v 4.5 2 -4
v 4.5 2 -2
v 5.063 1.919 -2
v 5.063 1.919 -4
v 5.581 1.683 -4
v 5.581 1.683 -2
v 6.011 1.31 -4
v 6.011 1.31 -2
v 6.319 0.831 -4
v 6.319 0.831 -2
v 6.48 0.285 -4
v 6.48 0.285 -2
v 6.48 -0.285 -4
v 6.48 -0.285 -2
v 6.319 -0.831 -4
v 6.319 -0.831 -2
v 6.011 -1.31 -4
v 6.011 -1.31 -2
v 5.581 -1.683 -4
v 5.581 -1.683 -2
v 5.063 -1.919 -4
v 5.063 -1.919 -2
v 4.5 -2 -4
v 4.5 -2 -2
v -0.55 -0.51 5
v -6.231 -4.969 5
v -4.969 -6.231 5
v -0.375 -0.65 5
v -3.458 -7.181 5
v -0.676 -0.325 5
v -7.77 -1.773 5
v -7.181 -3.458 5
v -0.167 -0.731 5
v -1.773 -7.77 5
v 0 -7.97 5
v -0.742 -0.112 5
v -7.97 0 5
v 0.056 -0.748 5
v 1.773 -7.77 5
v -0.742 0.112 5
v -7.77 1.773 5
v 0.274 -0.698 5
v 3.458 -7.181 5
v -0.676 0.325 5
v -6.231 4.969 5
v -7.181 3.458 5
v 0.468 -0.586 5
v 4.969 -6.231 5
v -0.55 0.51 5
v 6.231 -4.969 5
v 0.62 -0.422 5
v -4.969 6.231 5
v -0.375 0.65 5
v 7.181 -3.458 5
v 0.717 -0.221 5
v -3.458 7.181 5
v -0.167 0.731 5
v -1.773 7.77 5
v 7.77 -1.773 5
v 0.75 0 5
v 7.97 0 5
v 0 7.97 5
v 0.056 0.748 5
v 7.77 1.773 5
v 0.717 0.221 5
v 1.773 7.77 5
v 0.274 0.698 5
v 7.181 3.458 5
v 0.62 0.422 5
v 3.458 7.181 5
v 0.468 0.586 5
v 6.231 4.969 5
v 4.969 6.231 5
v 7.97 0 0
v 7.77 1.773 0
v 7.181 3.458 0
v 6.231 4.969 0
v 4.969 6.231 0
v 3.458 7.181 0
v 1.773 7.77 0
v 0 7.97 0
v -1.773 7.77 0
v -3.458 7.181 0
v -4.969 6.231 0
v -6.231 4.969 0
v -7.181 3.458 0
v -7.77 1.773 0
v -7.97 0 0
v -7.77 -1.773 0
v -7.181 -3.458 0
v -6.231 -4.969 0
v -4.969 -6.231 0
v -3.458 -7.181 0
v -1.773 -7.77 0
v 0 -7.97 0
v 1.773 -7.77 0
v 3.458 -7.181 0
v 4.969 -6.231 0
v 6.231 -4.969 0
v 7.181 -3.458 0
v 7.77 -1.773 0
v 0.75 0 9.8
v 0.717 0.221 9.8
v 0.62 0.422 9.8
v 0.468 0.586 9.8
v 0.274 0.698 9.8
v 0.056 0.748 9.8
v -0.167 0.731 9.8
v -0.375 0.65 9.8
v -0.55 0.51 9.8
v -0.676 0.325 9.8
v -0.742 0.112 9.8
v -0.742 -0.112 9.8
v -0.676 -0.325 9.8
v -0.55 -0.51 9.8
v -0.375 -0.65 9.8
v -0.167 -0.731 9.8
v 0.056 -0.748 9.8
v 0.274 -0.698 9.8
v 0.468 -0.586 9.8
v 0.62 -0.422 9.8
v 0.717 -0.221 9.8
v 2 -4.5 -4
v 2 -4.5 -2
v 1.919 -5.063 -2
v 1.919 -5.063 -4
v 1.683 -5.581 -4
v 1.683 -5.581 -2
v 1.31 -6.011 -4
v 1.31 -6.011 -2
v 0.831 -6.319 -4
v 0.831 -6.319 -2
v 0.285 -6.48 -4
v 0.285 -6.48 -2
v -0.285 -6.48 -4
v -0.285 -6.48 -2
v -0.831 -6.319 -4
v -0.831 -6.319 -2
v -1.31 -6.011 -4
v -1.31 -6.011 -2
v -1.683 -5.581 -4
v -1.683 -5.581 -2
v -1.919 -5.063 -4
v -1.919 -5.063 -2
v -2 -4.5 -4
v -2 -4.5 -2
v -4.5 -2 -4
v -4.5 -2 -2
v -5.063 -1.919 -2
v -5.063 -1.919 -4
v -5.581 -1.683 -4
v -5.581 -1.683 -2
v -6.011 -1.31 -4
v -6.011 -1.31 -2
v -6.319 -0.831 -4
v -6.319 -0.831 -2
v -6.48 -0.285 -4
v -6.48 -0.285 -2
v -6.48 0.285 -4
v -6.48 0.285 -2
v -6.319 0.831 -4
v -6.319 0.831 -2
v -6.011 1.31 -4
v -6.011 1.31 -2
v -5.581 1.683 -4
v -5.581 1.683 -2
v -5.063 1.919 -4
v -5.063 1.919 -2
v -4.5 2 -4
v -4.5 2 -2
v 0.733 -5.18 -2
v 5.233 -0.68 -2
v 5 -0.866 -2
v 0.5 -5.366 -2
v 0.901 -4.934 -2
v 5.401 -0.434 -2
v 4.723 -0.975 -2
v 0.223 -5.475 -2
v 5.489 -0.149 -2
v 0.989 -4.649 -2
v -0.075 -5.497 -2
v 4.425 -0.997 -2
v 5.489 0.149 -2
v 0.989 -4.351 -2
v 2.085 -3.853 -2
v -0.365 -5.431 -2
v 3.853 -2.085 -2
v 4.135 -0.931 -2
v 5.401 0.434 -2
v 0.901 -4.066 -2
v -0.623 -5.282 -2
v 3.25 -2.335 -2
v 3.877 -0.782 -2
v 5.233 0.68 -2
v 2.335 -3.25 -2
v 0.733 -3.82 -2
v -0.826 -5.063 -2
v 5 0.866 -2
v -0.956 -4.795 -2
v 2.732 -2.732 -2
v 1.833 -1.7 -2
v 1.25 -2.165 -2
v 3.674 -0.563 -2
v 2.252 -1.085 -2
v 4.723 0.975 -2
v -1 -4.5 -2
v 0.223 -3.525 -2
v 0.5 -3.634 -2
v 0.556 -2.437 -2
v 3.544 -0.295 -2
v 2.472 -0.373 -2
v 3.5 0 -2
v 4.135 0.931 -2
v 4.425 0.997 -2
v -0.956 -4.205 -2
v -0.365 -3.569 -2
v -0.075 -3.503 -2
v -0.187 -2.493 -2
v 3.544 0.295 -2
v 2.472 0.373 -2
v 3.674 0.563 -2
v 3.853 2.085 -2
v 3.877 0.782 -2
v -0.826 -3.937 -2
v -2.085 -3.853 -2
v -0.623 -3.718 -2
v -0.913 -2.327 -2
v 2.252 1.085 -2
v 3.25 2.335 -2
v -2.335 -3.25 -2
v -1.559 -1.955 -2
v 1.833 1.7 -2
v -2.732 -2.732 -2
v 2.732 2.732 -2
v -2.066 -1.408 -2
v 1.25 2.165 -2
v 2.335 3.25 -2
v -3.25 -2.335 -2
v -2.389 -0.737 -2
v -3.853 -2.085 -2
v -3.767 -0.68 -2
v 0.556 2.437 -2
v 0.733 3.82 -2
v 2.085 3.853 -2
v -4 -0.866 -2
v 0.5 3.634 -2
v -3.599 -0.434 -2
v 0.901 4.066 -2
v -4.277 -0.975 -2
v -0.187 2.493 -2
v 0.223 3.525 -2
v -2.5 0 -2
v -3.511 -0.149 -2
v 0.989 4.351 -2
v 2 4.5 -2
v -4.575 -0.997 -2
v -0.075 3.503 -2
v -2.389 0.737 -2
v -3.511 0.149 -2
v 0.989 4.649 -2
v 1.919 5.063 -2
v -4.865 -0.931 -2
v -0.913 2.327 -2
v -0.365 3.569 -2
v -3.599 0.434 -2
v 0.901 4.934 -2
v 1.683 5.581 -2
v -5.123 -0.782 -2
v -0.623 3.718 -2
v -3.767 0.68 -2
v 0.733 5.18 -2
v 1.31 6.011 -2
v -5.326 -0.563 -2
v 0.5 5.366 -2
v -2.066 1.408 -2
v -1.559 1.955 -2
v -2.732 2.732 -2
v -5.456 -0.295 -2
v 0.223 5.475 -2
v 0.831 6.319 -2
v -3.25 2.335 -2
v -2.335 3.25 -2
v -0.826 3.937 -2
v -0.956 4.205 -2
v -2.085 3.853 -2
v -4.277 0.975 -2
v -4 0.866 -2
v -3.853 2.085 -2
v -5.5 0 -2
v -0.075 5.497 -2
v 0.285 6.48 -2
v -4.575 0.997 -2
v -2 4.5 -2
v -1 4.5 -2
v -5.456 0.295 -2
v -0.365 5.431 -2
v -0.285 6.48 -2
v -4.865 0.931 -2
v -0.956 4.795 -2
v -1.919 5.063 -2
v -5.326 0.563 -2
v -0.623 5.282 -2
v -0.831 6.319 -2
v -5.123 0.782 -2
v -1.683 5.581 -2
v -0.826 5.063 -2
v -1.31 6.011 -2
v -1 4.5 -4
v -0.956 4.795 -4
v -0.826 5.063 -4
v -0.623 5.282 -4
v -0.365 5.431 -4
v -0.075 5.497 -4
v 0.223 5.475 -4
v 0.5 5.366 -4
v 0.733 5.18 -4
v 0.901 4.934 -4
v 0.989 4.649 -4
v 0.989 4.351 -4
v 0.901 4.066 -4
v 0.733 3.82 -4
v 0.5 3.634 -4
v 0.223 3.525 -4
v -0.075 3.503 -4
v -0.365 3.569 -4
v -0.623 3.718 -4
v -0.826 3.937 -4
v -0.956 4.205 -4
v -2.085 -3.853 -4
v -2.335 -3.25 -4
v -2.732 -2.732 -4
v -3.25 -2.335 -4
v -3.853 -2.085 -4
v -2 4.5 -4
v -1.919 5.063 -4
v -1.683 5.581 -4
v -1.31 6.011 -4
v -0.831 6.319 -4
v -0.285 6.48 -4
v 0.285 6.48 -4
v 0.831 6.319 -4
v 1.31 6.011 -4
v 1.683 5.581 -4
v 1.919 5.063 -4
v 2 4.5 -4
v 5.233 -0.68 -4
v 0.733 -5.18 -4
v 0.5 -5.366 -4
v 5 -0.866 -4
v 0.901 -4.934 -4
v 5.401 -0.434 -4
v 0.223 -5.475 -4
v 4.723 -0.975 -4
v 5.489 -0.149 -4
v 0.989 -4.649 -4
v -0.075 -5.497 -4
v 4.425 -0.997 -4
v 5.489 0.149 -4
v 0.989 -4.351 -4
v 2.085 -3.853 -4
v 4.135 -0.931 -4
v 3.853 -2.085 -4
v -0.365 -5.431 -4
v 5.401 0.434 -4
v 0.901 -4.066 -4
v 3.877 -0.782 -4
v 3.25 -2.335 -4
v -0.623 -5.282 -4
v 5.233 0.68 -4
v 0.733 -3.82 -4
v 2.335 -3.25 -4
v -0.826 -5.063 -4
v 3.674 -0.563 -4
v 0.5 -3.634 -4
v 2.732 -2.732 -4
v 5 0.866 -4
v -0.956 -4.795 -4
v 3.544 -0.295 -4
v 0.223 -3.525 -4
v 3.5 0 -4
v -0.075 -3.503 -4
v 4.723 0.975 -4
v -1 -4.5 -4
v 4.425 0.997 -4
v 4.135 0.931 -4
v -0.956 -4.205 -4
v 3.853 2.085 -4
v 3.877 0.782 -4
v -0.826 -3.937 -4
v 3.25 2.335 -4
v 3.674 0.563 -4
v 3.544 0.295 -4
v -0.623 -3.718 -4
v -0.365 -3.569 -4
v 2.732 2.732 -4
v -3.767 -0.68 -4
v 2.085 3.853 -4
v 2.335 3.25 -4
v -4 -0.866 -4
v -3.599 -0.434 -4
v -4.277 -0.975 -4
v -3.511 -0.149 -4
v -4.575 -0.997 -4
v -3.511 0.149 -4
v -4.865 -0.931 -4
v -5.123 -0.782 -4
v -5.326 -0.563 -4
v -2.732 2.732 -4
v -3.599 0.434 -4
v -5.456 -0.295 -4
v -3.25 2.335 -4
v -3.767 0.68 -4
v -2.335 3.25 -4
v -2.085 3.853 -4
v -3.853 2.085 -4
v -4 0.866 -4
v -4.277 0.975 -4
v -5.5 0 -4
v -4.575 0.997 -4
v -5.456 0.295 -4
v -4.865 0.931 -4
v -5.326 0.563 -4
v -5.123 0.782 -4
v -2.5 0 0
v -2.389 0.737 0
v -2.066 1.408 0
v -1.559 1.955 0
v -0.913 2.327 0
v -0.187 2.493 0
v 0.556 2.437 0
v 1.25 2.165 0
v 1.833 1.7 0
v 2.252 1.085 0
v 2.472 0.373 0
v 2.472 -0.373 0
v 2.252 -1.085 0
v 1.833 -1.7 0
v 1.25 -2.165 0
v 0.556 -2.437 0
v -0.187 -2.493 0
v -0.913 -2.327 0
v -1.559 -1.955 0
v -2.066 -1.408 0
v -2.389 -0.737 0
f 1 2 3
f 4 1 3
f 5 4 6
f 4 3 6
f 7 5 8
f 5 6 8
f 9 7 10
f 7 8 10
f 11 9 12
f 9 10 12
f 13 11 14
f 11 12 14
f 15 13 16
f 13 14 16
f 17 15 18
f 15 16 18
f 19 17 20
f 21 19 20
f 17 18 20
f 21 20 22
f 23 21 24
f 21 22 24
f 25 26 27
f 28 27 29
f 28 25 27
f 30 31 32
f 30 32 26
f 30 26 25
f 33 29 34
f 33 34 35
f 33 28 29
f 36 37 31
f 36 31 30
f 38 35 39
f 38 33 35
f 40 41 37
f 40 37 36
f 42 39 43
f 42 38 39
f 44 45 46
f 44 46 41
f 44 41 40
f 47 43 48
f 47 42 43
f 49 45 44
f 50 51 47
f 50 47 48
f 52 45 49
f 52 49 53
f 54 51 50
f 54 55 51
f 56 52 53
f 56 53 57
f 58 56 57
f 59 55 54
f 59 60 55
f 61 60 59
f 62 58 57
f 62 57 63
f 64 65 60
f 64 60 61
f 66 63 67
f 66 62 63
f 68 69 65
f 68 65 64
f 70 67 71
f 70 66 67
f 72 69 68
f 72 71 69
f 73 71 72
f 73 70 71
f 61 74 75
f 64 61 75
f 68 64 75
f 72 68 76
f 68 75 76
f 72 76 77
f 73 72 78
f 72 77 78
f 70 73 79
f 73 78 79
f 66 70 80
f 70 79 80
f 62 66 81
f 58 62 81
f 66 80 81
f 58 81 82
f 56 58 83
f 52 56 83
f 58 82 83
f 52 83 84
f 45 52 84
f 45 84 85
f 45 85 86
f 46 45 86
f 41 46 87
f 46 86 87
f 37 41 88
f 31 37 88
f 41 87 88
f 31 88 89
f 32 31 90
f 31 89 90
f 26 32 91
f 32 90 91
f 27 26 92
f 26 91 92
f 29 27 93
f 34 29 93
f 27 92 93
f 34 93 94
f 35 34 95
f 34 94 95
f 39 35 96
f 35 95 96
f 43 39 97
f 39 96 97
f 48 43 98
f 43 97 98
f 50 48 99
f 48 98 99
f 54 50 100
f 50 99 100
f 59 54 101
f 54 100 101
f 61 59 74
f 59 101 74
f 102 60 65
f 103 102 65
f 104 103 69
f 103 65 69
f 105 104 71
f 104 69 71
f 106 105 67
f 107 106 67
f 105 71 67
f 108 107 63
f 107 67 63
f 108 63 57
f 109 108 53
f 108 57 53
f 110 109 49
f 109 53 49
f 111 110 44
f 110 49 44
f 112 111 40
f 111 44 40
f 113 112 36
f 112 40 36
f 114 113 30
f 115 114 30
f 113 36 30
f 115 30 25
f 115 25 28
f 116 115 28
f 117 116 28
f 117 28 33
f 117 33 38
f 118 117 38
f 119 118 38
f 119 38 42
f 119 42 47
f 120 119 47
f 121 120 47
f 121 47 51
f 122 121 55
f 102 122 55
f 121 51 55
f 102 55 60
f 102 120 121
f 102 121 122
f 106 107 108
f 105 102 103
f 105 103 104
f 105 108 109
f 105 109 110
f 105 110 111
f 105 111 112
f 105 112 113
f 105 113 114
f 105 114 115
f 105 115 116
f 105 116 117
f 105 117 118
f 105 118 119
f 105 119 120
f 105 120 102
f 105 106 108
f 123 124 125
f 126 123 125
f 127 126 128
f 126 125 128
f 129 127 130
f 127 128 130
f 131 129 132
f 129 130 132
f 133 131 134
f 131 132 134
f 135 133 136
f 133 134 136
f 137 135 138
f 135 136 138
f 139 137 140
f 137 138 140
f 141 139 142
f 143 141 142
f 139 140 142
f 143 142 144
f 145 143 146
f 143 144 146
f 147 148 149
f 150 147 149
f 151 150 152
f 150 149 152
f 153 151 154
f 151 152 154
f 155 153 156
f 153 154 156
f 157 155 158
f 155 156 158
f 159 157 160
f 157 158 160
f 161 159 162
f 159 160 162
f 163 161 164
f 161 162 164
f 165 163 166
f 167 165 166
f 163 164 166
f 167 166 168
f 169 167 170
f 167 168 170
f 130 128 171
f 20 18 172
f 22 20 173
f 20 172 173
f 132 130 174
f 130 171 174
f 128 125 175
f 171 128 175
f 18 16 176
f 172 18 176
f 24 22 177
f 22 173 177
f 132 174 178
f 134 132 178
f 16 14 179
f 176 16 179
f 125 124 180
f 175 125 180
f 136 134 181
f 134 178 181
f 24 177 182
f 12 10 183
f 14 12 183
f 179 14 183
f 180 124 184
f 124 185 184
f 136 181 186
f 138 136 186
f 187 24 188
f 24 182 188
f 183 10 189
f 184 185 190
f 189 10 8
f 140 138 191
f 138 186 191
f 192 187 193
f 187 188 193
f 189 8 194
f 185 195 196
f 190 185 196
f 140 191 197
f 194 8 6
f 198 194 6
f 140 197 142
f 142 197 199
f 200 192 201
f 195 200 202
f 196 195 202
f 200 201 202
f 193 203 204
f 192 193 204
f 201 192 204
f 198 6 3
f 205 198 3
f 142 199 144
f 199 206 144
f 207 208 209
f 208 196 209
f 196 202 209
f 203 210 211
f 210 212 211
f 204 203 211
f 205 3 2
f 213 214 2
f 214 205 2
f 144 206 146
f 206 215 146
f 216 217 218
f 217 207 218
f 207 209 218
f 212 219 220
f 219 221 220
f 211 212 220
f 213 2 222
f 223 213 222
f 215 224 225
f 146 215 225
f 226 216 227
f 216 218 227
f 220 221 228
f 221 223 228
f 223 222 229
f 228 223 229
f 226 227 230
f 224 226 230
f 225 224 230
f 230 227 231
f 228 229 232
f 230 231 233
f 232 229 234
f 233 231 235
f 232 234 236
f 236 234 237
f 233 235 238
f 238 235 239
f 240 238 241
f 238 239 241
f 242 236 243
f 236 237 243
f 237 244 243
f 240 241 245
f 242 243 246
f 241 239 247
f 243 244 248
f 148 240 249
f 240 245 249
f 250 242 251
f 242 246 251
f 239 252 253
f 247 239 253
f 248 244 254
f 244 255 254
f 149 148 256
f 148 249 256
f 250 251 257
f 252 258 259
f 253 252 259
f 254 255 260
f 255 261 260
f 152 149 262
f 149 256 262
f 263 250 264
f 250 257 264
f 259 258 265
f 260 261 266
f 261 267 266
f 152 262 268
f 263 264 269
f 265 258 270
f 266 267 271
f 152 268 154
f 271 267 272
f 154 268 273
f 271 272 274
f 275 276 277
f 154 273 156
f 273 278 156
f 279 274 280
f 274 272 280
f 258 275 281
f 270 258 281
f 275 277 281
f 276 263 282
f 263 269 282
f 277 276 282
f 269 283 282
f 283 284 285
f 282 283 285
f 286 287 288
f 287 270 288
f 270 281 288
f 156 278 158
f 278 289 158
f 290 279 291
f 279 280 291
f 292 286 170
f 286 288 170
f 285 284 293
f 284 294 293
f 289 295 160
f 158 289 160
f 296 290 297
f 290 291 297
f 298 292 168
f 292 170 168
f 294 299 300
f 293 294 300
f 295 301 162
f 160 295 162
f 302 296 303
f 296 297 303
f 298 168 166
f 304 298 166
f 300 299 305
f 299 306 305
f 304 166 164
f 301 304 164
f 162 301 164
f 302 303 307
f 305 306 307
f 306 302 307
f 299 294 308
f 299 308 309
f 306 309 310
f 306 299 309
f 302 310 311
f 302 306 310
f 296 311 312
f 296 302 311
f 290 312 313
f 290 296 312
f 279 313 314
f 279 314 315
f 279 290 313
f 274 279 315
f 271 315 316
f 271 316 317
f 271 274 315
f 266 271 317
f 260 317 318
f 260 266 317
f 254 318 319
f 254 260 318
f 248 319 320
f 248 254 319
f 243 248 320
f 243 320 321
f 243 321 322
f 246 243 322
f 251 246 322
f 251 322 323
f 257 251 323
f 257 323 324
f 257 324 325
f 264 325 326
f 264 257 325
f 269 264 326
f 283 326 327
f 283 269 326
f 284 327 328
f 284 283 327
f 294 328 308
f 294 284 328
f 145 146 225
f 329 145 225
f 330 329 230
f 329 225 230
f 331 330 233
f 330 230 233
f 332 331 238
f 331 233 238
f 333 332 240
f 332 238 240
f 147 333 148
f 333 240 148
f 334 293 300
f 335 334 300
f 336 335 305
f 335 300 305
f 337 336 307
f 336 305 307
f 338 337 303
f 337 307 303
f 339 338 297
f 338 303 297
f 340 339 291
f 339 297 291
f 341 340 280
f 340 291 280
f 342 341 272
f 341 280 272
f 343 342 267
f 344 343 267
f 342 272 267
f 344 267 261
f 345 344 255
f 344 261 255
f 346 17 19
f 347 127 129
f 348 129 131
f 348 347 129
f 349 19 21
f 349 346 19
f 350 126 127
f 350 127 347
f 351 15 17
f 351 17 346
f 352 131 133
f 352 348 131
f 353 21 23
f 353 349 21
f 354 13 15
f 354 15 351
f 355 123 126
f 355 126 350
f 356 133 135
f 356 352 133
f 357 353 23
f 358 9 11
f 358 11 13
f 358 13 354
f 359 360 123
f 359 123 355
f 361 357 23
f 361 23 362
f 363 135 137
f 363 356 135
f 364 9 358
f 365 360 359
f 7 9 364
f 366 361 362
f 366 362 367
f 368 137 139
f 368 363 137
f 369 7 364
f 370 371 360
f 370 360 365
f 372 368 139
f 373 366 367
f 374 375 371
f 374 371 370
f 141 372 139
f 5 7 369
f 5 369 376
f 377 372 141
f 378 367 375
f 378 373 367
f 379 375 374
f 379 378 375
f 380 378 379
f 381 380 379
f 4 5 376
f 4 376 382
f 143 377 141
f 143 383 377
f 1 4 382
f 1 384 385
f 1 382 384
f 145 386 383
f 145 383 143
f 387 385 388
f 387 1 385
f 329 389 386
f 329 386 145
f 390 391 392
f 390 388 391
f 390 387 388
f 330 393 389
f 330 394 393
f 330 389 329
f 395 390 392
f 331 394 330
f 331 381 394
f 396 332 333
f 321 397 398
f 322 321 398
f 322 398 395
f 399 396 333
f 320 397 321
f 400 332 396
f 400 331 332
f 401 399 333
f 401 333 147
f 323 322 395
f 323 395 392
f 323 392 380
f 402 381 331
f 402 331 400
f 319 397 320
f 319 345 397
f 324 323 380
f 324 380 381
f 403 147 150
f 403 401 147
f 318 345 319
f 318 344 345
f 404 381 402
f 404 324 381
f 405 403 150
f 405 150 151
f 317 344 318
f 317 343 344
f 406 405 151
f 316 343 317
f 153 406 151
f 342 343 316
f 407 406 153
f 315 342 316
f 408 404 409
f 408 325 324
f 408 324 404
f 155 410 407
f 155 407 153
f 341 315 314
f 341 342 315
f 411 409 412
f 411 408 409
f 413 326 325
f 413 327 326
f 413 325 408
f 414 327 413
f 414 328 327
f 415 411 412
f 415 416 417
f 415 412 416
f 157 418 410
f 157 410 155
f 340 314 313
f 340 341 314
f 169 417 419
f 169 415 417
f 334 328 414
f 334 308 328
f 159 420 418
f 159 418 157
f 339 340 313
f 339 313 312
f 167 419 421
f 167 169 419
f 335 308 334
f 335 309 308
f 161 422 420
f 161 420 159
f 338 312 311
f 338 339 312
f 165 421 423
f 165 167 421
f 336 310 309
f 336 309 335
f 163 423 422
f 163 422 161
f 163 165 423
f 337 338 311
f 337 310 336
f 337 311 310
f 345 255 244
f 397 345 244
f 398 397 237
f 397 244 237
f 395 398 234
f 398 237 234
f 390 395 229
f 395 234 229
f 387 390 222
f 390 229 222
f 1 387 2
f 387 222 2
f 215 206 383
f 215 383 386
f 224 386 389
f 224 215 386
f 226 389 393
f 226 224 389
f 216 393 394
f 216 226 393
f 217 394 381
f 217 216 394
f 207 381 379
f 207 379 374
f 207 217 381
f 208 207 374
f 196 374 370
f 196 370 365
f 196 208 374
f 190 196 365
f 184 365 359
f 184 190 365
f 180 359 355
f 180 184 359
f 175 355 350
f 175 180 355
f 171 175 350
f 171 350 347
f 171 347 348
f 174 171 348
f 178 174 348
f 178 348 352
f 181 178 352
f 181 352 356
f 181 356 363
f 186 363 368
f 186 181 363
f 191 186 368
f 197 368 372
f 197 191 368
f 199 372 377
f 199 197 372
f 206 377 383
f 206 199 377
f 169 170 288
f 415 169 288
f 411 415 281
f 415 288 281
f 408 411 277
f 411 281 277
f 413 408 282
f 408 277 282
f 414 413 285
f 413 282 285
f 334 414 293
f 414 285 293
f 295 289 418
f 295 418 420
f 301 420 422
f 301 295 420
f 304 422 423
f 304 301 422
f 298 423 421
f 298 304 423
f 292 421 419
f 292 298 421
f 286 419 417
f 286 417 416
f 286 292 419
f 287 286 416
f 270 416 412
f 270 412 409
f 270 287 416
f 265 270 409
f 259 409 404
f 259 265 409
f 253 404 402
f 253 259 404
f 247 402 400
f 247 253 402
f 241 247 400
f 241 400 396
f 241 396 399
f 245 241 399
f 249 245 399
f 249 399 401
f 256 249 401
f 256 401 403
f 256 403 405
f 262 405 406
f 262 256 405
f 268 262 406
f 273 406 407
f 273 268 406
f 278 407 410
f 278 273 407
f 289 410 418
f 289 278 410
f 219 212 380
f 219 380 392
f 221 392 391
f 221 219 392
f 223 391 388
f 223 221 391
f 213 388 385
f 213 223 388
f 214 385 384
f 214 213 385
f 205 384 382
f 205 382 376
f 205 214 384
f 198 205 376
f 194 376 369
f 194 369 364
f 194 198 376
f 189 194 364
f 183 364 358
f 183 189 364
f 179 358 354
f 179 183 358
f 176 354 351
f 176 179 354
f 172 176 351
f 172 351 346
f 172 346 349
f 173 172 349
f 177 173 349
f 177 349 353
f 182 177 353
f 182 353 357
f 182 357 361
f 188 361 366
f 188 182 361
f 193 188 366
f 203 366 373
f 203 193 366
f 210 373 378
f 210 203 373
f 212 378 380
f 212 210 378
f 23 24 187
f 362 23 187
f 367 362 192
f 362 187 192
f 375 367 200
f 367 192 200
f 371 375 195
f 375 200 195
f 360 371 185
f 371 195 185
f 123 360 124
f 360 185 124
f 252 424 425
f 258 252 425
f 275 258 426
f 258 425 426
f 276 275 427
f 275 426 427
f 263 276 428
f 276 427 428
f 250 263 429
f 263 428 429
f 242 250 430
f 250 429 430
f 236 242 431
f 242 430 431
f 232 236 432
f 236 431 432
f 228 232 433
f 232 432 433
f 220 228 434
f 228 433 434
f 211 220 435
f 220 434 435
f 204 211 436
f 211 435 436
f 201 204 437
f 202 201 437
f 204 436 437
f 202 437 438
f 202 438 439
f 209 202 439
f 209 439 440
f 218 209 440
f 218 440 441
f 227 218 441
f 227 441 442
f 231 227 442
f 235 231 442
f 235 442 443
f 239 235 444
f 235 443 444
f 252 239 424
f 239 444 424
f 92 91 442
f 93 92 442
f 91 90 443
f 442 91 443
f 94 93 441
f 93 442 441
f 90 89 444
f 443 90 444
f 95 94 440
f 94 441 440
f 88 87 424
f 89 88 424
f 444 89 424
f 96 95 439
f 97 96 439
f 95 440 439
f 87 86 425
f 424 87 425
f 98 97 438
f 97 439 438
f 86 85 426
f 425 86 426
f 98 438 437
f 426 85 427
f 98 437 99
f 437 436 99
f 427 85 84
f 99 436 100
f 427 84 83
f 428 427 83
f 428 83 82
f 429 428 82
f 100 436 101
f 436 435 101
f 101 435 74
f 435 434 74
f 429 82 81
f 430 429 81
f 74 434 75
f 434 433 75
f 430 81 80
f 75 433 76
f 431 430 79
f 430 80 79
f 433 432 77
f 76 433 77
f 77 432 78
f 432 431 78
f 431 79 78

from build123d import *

# Parameters (mm, degrees)
SKETCH1_R           = 7.97
MOTOR_DEPTH         = 5
SHAFT_FOR_PROP_R    = 0.75
BOSS_EXTRUDE2_DEPTH = 4.8
SKETCH3_R           = 2.5
BOSS_EXTRUDE3_DEPTH = 2
SKETCH5_R           = 1
BOSS_EXTRUDE4_DEPTH = 2


with BuildPart() as part:
    # Sketch1 → motor (new body)
    with BuildSketch(Plane.XY):
        Circle(SKETCH1_R)
    extrude(amount=MOTOR_DEPTH)

    # shaft for prop → Boss-Extrude2 (add)
    with BuildSketch(Plane.XY.offset(5)):
        Circle(SHAFT_FOR_PROP_R)
    extrude(amount=BOSS_EXTRUDE2_DEPTH)

    # Sketch3 → Boss-Extrude3 (add)
    with BuildSketch(Plane(origin=(0, 0, 0), x_dir=(-1, 0, 0), z_dir=(0, 0, -1))):
        Circle(SKETCH3_R)
    extrude(amount=BOSS_EXTRUDE3_DEPTH)

    # Sketch5 → Boss-Extrude4 (add)
    with BuildSketch(Plane(origin=(0, 0, -2), x_dir=(-1, 0, 0), z_dir=(0, 0, -1))):
        with BuildLine():
            ThreePointArc((-4.5, 2), (-6.5, 0), (-4.5, -2))
            ThreePointArc((-4.5, -2), (-2.732233047, -2.732233047), (-2, -4.5))
            ThreePointArc((-2, -4.5), (0, -6.5), (2, -4.5))
            ThreePointArc((2, -4.5), (2.732233047, -2.732233047), (4.5, -2))
            ThreePointArc((4.5, -2), (6.5, 0), (4.5, 2))
            ThreePointArc((4.5, 2), (2.732233047, 2.732233047), (2, 4.5))
            ThreePointArc((2, 4.5), (0, 6.5), (-2, 4.5))
            ThreePointArc((-2, 4.5), (-2.732233047, 2.732233047), (-4.5, 2))
        make_face()
        with Locations((4.5, 0)):
            Circle(SKETCH5_R, mode=Mode.SUBTRACT)
        with Locations((-4.5, 0)):
            Circle(SKETCH5_R, mode=Mode.SUBTRACT)
        with Locations((0, -4.5)):
            Circle(SKETCH5_R, mode=Mode.SUBTRACT)
        with Locations((0, 4.5)):
            Circle(SKETCH5_R, mode=Mode.SUBTRACT)
    extrude(amount=BOSS_EXTRUDE4_DEPTH)


solid = part.part
